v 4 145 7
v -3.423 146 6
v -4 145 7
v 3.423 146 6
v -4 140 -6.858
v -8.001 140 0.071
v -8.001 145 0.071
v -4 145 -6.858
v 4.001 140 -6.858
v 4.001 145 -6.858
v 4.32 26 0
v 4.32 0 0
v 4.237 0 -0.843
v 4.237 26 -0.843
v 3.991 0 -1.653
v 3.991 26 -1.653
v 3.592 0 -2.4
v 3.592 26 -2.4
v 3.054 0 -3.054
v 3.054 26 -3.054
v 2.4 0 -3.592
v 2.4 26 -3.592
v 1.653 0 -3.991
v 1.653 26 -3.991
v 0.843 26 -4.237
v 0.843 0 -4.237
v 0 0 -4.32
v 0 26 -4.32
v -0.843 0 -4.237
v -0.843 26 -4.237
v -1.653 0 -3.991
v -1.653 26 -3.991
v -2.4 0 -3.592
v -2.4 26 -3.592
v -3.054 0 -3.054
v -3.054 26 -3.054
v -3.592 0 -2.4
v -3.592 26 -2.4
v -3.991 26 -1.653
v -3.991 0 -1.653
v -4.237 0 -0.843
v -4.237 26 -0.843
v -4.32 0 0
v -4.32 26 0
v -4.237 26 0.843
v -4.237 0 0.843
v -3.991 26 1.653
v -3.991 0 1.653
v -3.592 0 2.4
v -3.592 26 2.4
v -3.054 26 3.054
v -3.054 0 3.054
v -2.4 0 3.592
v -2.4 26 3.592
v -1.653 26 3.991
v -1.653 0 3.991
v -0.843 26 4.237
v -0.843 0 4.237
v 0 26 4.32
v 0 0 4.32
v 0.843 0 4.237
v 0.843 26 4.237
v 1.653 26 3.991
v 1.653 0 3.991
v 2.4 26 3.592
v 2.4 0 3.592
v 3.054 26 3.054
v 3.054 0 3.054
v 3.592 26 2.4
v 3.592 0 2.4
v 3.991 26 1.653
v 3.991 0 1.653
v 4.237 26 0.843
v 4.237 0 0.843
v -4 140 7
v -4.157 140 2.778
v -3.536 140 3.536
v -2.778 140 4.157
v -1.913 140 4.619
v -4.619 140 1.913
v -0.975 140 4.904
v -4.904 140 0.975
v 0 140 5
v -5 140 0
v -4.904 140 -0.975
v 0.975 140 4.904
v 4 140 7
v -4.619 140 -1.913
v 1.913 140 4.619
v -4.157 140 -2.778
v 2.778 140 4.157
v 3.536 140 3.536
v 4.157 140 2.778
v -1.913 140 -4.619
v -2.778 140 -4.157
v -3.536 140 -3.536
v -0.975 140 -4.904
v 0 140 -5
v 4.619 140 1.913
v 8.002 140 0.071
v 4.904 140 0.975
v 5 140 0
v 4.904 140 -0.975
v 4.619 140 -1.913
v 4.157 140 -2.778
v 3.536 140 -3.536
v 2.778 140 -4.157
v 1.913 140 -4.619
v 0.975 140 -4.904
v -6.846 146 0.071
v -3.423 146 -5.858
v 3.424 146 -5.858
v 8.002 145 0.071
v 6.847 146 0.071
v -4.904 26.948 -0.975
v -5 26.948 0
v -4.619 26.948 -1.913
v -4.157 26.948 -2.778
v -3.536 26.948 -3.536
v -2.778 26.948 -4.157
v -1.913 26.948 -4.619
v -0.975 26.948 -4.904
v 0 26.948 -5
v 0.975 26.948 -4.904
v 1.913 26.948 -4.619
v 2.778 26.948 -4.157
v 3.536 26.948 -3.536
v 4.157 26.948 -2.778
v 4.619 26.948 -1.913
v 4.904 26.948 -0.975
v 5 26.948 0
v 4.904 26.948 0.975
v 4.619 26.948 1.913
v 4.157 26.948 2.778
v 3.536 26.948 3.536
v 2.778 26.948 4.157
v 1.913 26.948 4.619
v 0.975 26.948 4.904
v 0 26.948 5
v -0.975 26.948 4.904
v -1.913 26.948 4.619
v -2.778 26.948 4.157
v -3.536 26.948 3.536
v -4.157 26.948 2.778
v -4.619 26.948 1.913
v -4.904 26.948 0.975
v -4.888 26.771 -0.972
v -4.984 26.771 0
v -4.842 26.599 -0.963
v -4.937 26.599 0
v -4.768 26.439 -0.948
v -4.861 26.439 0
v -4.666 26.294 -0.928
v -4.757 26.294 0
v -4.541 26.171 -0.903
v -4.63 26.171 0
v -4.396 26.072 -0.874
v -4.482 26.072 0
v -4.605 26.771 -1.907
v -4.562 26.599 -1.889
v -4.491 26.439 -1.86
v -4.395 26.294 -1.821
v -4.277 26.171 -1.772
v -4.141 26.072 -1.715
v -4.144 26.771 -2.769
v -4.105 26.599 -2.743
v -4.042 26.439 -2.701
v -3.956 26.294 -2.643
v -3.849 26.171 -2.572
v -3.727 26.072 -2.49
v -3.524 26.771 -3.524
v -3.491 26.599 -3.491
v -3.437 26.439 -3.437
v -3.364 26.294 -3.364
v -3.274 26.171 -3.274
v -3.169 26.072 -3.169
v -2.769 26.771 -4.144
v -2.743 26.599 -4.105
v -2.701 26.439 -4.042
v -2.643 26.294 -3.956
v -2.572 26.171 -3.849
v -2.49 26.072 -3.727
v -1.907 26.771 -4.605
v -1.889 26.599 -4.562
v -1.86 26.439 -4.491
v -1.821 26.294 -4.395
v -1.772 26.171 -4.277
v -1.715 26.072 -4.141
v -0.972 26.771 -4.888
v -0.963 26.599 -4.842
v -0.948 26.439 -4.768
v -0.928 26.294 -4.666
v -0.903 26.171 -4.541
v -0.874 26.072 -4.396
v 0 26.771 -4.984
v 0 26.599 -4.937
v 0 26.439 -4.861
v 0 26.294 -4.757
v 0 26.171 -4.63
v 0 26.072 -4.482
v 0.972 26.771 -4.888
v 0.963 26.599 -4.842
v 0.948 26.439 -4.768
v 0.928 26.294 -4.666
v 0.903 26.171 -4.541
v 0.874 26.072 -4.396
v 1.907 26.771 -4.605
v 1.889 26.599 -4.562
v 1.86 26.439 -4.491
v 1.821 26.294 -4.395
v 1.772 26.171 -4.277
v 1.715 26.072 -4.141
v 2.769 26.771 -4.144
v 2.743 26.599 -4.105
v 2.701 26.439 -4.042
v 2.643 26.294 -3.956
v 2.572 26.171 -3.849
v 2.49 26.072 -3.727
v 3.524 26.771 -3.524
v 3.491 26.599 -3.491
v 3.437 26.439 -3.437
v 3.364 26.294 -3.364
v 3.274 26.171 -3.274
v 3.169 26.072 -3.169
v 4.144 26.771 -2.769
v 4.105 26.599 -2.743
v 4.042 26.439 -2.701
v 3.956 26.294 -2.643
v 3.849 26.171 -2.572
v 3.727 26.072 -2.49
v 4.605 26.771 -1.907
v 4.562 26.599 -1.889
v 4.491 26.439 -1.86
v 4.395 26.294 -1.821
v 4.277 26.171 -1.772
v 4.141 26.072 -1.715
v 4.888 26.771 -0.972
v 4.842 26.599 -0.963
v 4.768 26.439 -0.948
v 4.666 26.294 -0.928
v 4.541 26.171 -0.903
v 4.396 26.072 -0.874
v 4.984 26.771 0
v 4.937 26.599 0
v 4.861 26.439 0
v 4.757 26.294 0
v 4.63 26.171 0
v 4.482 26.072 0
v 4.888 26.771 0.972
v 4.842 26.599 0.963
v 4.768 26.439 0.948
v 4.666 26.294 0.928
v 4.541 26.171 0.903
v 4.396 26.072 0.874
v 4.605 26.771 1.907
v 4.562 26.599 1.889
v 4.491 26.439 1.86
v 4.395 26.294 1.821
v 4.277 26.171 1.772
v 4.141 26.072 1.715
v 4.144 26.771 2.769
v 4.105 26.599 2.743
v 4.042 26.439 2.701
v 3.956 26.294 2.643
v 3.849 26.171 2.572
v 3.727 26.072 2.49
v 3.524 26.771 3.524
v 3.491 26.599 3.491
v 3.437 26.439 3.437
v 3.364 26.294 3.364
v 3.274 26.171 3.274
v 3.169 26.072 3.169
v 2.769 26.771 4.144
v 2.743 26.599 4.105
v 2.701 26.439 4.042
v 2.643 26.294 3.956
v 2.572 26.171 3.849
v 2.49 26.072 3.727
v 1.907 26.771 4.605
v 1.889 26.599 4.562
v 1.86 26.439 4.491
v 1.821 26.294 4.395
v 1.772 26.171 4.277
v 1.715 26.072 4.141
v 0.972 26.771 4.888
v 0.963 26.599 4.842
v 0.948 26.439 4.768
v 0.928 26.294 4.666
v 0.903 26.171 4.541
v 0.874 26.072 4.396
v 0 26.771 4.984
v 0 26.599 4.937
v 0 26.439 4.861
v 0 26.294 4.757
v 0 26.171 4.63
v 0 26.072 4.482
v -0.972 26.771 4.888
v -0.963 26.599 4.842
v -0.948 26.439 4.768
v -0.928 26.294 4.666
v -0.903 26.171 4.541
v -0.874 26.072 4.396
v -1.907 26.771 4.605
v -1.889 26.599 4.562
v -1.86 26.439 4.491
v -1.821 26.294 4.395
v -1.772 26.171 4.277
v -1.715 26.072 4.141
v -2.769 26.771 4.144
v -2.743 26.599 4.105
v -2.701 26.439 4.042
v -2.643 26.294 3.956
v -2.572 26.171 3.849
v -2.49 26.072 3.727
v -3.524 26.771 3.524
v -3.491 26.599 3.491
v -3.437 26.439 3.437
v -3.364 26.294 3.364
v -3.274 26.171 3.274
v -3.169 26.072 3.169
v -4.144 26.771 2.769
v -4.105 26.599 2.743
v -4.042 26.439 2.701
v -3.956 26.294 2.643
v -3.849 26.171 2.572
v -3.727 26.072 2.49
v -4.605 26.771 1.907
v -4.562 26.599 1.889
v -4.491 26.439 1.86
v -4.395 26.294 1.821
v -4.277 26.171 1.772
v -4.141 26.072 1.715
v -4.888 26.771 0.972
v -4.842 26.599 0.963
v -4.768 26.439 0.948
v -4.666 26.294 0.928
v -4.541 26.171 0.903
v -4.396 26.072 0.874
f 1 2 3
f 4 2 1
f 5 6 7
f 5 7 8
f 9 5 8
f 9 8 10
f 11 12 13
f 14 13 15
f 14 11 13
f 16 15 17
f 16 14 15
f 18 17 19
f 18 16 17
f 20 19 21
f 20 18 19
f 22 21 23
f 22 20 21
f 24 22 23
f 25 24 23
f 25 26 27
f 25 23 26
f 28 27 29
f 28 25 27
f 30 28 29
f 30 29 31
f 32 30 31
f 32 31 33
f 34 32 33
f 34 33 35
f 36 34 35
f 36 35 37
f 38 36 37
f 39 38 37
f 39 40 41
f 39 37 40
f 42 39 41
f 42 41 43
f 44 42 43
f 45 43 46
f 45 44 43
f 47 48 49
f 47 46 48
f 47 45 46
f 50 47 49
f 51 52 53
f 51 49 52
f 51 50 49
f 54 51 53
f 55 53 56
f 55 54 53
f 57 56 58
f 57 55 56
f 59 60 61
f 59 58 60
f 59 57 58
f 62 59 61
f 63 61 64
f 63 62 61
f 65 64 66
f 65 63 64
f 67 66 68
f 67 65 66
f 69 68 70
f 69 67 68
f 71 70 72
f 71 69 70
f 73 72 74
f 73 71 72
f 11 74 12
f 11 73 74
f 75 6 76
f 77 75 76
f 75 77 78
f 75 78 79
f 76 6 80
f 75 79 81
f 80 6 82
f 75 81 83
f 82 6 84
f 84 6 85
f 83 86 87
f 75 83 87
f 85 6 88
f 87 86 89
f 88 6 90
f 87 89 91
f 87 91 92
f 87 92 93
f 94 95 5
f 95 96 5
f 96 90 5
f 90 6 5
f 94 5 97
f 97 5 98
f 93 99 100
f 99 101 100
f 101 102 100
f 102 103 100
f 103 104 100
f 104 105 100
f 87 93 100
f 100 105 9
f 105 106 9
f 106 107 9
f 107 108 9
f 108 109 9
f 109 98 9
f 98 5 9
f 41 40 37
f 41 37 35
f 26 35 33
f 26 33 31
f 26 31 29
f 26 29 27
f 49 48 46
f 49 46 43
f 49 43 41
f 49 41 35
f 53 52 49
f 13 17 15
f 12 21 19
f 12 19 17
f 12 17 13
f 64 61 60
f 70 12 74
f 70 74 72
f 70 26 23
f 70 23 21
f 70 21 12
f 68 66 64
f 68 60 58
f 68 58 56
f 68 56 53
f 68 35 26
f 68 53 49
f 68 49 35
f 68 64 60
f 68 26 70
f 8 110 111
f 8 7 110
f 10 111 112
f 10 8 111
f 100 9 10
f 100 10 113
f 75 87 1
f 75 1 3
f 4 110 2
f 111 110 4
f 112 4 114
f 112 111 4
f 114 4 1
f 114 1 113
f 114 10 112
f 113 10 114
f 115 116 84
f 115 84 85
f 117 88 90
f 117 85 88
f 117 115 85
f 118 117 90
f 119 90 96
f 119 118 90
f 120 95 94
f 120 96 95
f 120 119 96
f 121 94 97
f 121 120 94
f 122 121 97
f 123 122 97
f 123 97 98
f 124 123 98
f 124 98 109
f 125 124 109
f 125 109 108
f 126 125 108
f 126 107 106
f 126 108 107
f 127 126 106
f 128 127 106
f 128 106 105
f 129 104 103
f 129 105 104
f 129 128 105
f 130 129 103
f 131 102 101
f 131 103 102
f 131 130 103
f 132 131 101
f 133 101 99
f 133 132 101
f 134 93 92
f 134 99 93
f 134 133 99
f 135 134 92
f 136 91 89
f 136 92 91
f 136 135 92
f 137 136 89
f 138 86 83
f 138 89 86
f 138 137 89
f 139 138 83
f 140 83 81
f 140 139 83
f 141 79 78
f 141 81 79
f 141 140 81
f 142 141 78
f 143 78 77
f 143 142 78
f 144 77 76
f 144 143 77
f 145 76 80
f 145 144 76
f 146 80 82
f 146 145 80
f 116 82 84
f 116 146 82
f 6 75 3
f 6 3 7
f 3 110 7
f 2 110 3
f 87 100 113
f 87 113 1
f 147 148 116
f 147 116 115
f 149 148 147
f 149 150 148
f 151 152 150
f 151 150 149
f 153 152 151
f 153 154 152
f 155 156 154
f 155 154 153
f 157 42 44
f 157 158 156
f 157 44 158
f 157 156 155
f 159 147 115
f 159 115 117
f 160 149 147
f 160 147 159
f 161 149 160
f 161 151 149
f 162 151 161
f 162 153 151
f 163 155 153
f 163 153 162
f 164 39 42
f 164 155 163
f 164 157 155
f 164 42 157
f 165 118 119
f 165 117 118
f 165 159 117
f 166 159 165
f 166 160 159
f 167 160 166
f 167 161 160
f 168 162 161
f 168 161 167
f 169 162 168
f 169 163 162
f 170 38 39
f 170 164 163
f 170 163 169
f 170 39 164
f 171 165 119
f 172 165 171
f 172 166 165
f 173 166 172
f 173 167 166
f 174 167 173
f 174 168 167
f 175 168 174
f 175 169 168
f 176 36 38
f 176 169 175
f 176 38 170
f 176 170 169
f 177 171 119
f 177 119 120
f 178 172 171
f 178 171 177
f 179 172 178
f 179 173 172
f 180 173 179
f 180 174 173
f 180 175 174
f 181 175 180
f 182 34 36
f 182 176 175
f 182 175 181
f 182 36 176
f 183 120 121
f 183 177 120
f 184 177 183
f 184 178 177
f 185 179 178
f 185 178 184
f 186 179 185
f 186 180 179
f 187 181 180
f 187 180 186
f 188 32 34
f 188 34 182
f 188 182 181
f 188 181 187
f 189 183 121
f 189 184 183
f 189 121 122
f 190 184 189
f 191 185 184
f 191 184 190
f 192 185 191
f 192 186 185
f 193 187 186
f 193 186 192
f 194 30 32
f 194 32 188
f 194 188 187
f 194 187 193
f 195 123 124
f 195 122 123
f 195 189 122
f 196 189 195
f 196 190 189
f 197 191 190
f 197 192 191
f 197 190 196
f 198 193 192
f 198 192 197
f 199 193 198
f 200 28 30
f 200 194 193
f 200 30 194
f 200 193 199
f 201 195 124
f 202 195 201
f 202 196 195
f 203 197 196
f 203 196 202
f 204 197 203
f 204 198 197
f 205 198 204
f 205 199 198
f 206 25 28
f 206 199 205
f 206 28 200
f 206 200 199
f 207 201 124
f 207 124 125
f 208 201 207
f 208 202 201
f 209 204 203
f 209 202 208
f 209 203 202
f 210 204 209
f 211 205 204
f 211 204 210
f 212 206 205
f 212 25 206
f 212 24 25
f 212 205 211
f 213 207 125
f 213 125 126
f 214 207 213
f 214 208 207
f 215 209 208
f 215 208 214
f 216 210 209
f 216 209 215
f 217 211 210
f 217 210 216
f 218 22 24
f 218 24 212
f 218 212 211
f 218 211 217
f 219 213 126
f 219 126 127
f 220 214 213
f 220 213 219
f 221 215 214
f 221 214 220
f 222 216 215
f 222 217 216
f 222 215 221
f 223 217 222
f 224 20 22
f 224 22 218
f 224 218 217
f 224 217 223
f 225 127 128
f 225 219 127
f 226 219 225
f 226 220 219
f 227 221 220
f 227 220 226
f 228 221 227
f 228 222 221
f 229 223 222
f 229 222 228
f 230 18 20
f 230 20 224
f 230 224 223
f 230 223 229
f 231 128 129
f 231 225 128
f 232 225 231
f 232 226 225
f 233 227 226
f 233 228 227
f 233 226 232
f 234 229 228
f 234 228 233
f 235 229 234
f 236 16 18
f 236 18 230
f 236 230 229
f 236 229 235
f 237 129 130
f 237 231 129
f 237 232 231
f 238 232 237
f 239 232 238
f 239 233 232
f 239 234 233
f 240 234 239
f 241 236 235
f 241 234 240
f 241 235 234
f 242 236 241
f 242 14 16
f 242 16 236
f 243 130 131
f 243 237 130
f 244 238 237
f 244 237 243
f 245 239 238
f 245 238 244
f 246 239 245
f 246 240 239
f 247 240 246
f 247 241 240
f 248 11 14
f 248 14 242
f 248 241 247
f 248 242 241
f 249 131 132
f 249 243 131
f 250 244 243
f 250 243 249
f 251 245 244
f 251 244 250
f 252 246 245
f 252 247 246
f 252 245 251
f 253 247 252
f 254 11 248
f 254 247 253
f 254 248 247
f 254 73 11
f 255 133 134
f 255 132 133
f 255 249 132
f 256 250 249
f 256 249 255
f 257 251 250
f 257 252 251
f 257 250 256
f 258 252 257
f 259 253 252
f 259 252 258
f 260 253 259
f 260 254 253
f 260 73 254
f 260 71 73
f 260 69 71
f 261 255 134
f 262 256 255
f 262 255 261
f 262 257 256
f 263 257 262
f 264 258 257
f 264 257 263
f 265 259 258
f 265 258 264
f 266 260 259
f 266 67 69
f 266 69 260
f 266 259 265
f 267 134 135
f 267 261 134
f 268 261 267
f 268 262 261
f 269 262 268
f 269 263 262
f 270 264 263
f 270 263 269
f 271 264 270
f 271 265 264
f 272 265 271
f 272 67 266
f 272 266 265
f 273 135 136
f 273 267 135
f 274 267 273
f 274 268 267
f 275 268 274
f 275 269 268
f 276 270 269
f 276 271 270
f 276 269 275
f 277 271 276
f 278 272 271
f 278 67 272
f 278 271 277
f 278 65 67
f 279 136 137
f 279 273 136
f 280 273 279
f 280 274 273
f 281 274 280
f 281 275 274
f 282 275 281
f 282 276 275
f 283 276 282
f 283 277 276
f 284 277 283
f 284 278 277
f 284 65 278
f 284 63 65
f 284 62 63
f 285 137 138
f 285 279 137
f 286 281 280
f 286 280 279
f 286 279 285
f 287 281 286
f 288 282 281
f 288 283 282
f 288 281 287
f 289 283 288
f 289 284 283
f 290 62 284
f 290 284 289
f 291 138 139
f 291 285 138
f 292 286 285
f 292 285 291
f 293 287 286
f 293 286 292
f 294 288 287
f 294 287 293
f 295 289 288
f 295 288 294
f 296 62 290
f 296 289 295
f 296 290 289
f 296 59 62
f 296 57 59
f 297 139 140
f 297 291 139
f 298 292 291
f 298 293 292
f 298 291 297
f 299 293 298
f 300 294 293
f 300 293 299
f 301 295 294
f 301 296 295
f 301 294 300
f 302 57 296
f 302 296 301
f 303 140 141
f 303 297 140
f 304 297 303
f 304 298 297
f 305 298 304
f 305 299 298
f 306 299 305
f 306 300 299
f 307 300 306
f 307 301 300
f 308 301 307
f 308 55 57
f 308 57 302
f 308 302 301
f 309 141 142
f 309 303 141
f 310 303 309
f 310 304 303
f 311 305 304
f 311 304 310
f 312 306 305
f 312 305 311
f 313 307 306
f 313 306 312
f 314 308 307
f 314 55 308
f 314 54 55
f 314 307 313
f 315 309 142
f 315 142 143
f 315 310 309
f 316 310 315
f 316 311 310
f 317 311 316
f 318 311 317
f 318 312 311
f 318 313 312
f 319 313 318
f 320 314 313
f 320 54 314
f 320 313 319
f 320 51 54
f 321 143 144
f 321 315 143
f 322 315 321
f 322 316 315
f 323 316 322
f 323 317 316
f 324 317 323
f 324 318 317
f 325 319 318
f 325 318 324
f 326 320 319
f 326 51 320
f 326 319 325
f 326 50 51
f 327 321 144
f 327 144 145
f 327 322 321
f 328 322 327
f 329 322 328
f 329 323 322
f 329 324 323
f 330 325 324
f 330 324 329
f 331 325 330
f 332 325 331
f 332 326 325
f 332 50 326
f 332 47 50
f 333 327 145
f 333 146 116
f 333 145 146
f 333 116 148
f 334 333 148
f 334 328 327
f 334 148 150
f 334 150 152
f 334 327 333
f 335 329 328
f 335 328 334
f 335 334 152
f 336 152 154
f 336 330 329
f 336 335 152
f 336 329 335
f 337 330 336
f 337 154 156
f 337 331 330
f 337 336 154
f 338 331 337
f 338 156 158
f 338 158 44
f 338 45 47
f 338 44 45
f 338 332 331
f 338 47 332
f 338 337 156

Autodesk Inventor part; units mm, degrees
ref_plane "YZ Plane" through (0, 0, 0) normal (1, 0, 0) x (0, 1, 0)
ref_plane "XZ Plane" through (0, 0, 0) normal (0, 1, 0) x (-1, 0, 0)
ref_plane "XY Plane" through (0, 0, 0) normal (0, 0, 1) x (1, 0, 0)
sketch "Sketch1" plane through (0, 0, 0) normal (0, 1, 0) x (-1, 0, 0)
  circle A0 centre (0, 0) radius 5
  dimension "d0" = 10
extrude "Extrusion1" add sketch "Sketch1" along normal blind 140
sketch "Sketch2" plane through (0, 140, 0) normal (0, 1, 0) x (1, 0, 0)
  line L0 (4, -7) -> (-4, -7)
  line L1 (-4, -7) -> (-8.0005, -0.0709)
  line L2 (-4, -7) -> (4.001, -7) construction
  line L3 (-8.0005, -0.0709) -> (-4, 6.8581)
  line L4 (-4, 6.8581) -> (4.001, 6.8581)
  line L5 (4.001, 6.8581) -> (8.0015, -0.0709)
  line L6 (8.0015, -0.0709) -> (4, -7)
  dimension "d5" = 8
  dimension "d6" = 8.001
  dimension "d7" = 120
  dimension "d8" = 8.001
  dimension "d9" = 120
  dimension "d10" = 8.001
  dimension "d11" = 120
  dimension "d12" = 8.001
  dimension "d13" = 120
extrude "Extrusion2" add sketch "Sketch2" along normal blind 6
chamfer "Chamfer1" distance 1 angle 45 6 edges at (0, 146, 7) (-6.0002, 146, 3.5355) (6.0008, 146, 3.5355) (6.0013, 146, -3.3936) (0.0005, 146, -6.8581) (-6.0002, 146, -3.3936)
sketch "Sketch3" plane through (0, 0, 0) normal (0, -1, 0) x (1, 0, 0)
  circle A0 centre (0, 0) radius 5 projected
extrude "Extrusion3" cut sketch "Sketch3" against normal blind 26
sketch "Sketch4" plane through (0, 26, 0) normal (0, -1, 0) x (1, 0, 0)
  circle A0 centre (0, 0) radius 5 projected
  circle A1 centre (0, 0) radius 4.3197
extrude "Extrusion4" add sketch "Sketch4" along normal blind 26 contours A1
fillet "Fillet1" radius 1 1 edges at (5, 26, 0)
thread "Thread1" size "3/8-16 UNC" class "2A" standard "ANSI Unified Screw Threads" full length
properties part number "Axel" material "Aluminum 6061-AHC"
